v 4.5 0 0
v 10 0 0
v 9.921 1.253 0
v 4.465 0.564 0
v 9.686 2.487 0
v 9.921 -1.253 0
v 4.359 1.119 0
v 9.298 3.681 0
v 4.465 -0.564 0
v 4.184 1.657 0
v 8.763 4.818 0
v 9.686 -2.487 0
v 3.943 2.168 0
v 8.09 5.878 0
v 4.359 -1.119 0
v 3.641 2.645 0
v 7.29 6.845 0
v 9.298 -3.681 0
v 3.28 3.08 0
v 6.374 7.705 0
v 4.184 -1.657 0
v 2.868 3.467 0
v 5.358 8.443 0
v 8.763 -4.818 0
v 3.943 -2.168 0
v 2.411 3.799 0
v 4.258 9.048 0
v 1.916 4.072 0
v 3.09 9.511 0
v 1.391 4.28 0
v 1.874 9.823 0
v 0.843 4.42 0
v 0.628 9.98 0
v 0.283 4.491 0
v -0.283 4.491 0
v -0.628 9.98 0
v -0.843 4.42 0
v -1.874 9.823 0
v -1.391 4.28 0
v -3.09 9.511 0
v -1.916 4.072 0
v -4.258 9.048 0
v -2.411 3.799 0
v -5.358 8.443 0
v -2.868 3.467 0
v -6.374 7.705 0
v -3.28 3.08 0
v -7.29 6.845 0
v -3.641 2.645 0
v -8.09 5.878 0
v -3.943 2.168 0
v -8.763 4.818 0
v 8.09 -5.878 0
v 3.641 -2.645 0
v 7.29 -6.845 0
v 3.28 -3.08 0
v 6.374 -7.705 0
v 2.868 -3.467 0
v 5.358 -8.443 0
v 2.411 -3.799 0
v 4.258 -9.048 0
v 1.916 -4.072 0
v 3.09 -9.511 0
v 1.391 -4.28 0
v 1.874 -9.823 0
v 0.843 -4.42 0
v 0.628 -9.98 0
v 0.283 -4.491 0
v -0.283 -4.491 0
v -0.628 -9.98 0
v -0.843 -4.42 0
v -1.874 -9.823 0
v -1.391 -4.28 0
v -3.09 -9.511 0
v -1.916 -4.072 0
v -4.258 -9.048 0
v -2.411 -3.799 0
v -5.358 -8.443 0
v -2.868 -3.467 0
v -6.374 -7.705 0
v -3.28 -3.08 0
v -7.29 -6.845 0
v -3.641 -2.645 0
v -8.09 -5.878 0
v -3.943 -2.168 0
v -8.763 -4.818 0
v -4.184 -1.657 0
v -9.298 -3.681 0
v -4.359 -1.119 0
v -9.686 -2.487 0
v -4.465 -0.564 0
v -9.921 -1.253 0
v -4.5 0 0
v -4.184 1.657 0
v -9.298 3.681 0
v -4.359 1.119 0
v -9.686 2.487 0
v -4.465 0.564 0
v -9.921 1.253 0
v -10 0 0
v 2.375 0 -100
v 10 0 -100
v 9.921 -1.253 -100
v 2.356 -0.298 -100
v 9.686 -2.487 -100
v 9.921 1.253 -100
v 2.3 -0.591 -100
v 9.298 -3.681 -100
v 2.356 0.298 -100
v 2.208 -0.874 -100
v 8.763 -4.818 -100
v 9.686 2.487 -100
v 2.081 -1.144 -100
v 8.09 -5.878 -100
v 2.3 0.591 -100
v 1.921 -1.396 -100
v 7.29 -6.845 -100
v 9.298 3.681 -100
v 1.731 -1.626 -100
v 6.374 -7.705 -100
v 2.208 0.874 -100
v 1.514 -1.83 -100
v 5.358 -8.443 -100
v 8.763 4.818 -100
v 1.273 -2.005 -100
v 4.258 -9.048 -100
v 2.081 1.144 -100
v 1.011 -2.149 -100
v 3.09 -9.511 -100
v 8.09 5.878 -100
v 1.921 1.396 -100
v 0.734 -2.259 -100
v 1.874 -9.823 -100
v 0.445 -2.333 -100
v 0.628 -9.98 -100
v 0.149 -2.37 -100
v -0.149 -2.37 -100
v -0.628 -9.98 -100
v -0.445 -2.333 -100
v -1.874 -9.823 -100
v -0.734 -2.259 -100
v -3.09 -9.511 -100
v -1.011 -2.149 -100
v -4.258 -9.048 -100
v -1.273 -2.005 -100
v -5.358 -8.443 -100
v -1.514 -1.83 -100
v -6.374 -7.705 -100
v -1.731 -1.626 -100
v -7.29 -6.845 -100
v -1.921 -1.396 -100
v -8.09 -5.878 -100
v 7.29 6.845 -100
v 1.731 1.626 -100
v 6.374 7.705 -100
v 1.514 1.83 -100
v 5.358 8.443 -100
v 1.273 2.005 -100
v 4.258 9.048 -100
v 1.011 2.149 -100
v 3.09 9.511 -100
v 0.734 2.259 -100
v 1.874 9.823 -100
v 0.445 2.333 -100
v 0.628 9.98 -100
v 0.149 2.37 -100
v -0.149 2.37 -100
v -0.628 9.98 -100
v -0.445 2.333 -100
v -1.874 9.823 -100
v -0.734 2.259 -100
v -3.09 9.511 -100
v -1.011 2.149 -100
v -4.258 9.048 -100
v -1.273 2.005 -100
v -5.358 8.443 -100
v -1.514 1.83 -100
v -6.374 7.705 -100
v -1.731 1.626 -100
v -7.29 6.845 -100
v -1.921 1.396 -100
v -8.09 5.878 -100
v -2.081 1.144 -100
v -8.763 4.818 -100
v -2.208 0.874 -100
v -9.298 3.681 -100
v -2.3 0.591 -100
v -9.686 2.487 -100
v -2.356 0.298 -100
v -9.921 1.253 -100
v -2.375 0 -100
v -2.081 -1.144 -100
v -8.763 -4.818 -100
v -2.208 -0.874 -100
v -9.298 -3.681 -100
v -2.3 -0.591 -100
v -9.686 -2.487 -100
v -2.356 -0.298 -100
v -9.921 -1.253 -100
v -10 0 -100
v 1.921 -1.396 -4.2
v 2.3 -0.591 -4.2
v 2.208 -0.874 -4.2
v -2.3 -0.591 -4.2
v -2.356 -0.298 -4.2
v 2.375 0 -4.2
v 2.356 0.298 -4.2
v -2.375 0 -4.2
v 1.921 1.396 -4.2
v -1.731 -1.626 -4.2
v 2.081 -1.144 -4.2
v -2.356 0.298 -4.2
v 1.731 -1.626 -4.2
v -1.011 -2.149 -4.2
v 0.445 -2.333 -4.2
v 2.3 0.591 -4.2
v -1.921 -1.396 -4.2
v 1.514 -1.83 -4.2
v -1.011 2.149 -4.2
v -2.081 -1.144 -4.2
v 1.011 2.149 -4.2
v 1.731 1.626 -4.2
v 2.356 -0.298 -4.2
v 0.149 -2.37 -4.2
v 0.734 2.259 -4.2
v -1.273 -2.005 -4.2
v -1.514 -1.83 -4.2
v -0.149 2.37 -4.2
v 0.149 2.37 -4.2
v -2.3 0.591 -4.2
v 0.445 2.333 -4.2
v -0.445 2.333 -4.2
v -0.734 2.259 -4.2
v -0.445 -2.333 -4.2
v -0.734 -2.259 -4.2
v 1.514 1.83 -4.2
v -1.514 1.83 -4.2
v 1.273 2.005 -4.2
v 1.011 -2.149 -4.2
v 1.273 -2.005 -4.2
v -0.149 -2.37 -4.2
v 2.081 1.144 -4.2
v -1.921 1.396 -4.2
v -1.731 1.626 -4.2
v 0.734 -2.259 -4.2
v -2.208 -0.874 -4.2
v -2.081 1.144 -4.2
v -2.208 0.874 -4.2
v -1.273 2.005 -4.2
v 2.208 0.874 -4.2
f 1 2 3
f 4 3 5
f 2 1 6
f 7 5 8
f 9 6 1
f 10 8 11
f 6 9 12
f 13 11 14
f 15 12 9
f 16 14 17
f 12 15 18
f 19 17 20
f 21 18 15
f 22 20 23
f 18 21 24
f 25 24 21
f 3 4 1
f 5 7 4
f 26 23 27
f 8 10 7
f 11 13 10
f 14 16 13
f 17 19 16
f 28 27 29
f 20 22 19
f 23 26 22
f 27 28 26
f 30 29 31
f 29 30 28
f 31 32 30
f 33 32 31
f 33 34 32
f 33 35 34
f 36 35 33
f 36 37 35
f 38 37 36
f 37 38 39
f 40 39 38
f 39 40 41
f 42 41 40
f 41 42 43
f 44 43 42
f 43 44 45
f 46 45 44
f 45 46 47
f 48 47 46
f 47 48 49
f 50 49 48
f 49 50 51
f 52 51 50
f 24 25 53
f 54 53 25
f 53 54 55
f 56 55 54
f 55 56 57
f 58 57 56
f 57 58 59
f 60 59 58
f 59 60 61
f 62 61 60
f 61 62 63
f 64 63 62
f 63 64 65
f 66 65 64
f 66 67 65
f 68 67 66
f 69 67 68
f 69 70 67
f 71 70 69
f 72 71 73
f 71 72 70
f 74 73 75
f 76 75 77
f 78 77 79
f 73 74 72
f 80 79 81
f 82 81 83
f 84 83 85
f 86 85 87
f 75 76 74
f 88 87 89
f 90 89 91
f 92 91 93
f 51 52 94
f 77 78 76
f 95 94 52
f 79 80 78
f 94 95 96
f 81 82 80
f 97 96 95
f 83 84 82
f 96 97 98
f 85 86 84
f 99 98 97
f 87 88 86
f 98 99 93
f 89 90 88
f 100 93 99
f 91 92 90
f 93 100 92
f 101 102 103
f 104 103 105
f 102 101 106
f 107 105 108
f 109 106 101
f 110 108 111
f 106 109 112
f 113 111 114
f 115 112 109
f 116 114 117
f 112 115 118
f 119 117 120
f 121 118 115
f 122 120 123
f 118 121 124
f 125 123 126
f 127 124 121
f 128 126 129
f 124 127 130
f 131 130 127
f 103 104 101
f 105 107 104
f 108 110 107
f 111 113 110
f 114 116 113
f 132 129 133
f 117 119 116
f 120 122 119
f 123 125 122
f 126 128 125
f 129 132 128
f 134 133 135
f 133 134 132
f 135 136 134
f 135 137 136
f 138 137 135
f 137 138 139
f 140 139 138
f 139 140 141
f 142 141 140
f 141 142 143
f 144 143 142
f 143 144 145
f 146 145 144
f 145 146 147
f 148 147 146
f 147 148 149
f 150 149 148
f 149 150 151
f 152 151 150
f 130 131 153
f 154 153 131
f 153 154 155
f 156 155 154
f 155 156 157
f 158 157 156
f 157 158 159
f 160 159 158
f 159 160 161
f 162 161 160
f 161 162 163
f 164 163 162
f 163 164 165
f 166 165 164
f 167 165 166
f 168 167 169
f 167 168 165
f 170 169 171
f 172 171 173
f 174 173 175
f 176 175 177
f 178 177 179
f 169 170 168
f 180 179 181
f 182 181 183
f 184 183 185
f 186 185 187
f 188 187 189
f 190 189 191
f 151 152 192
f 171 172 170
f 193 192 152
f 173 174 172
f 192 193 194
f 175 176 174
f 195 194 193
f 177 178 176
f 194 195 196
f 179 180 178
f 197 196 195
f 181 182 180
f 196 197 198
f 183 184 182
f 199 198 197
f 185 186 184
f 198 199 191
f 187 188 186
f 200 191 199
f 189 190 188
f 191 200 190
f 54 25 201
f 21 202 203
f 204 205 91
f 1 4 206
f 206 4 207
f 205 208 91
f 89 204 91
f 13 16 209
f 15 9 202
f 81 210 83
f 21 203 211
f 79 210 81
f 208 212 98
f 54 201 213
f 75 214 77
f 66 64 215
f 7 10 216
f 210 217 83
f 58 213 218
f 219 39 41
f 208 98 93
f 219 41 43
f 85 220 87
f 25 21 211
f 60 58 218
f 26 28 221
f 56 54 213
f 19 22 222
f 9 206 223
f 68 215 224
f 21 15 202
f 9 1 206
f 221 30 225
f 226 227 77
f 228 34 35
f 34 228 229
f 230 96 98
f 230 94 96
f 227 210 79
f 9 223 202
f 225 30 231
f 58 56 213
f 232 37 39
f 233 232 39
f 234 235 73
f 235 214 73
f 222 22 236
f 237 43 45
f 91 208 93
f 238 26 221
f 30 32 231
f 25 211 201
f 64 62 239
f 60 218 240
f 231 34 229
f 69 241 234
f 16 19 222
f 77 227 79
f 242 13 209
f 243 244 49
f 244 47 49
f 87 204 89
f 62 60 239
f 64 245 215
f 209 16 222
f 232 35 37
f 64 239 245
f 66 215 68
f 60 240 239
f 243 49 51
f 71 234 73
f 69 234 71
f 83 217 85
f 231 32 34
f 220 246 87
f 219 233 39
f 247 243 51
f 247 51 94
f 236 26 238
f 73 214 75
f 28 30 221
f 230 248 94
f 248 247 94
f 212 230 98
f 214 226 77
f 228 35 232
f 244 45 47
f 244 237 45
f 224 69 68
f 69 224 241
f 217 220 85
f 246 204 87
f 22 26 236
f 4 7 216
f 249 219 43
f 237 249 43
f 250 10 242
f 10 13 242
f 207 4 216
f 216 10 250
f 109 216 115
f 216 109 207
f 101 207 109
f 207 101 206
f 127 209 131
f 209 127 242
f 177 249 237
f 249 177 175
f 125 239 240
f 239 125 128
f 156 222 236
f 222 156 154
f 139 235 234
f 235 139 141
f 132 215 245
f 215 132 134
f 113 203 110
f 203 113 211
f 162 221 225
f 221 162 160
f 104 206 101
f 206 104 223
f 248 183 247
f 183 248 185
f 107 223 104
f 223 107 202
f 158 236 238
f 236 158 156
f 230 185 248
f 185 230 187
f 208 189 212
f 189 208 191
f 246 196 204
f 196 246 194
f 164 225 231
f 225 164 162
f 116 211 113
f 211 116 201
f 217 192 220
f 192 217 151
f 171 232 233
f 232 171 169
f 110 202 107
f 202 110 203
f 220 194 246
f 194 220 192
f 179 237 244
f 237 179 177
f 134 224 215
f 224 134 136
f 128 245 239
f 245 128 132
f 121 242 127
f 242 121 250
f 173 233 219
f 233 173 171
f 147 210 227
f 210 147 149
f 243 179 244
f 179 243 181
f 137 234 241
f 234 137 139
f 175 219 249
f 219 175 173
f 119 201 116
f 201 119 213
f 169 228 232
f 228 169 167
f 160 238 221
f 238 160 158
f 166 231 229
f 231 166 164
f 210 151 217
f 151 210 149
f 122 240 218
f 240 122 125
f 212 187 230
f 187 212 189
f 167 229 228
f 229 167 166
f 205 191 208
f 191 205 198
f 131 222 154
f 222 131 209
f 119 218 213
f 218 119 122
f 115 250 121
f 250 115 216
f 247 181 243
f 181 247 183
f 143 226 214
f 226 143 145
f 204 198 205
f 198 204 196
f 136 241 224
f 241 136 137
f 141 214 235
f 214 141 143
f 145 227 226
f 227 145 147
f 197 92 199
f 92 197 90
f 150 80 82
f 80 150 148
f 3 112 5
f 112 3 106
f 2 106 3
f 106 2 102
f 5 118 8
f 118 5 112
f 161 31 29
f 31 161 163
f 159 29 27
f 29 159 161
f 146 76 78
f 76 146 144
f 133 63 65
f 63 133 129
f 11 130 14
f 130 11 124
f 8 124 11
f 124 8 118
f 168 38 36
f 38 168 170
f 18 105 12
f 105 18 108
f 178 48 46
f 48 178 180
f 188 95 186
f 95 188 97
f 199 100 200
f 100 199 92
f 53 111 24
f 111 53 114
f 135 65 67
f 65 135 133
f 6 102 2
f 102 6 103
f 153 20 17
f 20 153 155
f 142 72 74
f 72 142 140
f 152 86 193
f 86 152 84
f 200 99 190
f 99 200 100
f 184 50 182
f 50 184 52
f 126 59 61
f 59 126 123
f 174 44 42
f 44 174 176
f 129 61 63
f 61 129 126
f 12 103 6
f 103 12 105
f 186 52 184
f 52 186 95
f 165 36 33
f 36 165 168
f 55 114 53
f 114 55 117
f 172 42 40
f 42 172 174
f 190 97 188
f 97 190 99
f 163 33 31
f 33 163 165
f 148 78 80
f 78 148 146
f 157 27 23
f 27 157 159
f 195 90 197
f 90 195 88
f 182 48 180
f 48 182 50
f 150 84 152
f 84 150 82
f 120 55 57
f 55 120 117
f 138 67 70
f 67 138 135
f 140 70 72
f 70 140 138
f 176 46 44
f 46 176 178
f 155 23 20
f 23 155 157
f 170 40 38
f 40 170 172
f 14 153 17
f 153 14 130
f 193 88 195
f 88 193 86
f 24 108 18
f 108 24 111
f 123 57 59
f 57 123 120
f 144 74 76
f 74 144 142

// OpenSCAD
$fn = 50;


difference() {
	union() {
		translate(v = [0, 0, -100.0000000000]) {
			cylinder(h = 100, r = 10.0000000000);
		}
		cylinder(h = 0, r = 19.0000000000);
	}
	union() {
		translate(v = [0, 0, 0]) {
			rotate(a = [0, 0, 0]) {
				difference() {
					union() {
						#translate(v = [0, 0, -100.0000000000]) {
							cylinder(h = 100, r = 2.2500000000);
						}
						#translate(v = [0, 0, -4.2000000000]) {
							cylinder(h = 4.2000000000, r1 = 2.3750000000, r2 = 4.5000000000);
						}
						#translate(v = [0, 0, -100.0000000000]) {
							cylinder(h = 100, r = 2.3750000000);
						}
						#translate(v = [0, 0, -100.0000000000]) {
							cylinder(h = 100, r = 2.2500000000);
						}
					}
					union();
				}
			}
		}
	}
}
